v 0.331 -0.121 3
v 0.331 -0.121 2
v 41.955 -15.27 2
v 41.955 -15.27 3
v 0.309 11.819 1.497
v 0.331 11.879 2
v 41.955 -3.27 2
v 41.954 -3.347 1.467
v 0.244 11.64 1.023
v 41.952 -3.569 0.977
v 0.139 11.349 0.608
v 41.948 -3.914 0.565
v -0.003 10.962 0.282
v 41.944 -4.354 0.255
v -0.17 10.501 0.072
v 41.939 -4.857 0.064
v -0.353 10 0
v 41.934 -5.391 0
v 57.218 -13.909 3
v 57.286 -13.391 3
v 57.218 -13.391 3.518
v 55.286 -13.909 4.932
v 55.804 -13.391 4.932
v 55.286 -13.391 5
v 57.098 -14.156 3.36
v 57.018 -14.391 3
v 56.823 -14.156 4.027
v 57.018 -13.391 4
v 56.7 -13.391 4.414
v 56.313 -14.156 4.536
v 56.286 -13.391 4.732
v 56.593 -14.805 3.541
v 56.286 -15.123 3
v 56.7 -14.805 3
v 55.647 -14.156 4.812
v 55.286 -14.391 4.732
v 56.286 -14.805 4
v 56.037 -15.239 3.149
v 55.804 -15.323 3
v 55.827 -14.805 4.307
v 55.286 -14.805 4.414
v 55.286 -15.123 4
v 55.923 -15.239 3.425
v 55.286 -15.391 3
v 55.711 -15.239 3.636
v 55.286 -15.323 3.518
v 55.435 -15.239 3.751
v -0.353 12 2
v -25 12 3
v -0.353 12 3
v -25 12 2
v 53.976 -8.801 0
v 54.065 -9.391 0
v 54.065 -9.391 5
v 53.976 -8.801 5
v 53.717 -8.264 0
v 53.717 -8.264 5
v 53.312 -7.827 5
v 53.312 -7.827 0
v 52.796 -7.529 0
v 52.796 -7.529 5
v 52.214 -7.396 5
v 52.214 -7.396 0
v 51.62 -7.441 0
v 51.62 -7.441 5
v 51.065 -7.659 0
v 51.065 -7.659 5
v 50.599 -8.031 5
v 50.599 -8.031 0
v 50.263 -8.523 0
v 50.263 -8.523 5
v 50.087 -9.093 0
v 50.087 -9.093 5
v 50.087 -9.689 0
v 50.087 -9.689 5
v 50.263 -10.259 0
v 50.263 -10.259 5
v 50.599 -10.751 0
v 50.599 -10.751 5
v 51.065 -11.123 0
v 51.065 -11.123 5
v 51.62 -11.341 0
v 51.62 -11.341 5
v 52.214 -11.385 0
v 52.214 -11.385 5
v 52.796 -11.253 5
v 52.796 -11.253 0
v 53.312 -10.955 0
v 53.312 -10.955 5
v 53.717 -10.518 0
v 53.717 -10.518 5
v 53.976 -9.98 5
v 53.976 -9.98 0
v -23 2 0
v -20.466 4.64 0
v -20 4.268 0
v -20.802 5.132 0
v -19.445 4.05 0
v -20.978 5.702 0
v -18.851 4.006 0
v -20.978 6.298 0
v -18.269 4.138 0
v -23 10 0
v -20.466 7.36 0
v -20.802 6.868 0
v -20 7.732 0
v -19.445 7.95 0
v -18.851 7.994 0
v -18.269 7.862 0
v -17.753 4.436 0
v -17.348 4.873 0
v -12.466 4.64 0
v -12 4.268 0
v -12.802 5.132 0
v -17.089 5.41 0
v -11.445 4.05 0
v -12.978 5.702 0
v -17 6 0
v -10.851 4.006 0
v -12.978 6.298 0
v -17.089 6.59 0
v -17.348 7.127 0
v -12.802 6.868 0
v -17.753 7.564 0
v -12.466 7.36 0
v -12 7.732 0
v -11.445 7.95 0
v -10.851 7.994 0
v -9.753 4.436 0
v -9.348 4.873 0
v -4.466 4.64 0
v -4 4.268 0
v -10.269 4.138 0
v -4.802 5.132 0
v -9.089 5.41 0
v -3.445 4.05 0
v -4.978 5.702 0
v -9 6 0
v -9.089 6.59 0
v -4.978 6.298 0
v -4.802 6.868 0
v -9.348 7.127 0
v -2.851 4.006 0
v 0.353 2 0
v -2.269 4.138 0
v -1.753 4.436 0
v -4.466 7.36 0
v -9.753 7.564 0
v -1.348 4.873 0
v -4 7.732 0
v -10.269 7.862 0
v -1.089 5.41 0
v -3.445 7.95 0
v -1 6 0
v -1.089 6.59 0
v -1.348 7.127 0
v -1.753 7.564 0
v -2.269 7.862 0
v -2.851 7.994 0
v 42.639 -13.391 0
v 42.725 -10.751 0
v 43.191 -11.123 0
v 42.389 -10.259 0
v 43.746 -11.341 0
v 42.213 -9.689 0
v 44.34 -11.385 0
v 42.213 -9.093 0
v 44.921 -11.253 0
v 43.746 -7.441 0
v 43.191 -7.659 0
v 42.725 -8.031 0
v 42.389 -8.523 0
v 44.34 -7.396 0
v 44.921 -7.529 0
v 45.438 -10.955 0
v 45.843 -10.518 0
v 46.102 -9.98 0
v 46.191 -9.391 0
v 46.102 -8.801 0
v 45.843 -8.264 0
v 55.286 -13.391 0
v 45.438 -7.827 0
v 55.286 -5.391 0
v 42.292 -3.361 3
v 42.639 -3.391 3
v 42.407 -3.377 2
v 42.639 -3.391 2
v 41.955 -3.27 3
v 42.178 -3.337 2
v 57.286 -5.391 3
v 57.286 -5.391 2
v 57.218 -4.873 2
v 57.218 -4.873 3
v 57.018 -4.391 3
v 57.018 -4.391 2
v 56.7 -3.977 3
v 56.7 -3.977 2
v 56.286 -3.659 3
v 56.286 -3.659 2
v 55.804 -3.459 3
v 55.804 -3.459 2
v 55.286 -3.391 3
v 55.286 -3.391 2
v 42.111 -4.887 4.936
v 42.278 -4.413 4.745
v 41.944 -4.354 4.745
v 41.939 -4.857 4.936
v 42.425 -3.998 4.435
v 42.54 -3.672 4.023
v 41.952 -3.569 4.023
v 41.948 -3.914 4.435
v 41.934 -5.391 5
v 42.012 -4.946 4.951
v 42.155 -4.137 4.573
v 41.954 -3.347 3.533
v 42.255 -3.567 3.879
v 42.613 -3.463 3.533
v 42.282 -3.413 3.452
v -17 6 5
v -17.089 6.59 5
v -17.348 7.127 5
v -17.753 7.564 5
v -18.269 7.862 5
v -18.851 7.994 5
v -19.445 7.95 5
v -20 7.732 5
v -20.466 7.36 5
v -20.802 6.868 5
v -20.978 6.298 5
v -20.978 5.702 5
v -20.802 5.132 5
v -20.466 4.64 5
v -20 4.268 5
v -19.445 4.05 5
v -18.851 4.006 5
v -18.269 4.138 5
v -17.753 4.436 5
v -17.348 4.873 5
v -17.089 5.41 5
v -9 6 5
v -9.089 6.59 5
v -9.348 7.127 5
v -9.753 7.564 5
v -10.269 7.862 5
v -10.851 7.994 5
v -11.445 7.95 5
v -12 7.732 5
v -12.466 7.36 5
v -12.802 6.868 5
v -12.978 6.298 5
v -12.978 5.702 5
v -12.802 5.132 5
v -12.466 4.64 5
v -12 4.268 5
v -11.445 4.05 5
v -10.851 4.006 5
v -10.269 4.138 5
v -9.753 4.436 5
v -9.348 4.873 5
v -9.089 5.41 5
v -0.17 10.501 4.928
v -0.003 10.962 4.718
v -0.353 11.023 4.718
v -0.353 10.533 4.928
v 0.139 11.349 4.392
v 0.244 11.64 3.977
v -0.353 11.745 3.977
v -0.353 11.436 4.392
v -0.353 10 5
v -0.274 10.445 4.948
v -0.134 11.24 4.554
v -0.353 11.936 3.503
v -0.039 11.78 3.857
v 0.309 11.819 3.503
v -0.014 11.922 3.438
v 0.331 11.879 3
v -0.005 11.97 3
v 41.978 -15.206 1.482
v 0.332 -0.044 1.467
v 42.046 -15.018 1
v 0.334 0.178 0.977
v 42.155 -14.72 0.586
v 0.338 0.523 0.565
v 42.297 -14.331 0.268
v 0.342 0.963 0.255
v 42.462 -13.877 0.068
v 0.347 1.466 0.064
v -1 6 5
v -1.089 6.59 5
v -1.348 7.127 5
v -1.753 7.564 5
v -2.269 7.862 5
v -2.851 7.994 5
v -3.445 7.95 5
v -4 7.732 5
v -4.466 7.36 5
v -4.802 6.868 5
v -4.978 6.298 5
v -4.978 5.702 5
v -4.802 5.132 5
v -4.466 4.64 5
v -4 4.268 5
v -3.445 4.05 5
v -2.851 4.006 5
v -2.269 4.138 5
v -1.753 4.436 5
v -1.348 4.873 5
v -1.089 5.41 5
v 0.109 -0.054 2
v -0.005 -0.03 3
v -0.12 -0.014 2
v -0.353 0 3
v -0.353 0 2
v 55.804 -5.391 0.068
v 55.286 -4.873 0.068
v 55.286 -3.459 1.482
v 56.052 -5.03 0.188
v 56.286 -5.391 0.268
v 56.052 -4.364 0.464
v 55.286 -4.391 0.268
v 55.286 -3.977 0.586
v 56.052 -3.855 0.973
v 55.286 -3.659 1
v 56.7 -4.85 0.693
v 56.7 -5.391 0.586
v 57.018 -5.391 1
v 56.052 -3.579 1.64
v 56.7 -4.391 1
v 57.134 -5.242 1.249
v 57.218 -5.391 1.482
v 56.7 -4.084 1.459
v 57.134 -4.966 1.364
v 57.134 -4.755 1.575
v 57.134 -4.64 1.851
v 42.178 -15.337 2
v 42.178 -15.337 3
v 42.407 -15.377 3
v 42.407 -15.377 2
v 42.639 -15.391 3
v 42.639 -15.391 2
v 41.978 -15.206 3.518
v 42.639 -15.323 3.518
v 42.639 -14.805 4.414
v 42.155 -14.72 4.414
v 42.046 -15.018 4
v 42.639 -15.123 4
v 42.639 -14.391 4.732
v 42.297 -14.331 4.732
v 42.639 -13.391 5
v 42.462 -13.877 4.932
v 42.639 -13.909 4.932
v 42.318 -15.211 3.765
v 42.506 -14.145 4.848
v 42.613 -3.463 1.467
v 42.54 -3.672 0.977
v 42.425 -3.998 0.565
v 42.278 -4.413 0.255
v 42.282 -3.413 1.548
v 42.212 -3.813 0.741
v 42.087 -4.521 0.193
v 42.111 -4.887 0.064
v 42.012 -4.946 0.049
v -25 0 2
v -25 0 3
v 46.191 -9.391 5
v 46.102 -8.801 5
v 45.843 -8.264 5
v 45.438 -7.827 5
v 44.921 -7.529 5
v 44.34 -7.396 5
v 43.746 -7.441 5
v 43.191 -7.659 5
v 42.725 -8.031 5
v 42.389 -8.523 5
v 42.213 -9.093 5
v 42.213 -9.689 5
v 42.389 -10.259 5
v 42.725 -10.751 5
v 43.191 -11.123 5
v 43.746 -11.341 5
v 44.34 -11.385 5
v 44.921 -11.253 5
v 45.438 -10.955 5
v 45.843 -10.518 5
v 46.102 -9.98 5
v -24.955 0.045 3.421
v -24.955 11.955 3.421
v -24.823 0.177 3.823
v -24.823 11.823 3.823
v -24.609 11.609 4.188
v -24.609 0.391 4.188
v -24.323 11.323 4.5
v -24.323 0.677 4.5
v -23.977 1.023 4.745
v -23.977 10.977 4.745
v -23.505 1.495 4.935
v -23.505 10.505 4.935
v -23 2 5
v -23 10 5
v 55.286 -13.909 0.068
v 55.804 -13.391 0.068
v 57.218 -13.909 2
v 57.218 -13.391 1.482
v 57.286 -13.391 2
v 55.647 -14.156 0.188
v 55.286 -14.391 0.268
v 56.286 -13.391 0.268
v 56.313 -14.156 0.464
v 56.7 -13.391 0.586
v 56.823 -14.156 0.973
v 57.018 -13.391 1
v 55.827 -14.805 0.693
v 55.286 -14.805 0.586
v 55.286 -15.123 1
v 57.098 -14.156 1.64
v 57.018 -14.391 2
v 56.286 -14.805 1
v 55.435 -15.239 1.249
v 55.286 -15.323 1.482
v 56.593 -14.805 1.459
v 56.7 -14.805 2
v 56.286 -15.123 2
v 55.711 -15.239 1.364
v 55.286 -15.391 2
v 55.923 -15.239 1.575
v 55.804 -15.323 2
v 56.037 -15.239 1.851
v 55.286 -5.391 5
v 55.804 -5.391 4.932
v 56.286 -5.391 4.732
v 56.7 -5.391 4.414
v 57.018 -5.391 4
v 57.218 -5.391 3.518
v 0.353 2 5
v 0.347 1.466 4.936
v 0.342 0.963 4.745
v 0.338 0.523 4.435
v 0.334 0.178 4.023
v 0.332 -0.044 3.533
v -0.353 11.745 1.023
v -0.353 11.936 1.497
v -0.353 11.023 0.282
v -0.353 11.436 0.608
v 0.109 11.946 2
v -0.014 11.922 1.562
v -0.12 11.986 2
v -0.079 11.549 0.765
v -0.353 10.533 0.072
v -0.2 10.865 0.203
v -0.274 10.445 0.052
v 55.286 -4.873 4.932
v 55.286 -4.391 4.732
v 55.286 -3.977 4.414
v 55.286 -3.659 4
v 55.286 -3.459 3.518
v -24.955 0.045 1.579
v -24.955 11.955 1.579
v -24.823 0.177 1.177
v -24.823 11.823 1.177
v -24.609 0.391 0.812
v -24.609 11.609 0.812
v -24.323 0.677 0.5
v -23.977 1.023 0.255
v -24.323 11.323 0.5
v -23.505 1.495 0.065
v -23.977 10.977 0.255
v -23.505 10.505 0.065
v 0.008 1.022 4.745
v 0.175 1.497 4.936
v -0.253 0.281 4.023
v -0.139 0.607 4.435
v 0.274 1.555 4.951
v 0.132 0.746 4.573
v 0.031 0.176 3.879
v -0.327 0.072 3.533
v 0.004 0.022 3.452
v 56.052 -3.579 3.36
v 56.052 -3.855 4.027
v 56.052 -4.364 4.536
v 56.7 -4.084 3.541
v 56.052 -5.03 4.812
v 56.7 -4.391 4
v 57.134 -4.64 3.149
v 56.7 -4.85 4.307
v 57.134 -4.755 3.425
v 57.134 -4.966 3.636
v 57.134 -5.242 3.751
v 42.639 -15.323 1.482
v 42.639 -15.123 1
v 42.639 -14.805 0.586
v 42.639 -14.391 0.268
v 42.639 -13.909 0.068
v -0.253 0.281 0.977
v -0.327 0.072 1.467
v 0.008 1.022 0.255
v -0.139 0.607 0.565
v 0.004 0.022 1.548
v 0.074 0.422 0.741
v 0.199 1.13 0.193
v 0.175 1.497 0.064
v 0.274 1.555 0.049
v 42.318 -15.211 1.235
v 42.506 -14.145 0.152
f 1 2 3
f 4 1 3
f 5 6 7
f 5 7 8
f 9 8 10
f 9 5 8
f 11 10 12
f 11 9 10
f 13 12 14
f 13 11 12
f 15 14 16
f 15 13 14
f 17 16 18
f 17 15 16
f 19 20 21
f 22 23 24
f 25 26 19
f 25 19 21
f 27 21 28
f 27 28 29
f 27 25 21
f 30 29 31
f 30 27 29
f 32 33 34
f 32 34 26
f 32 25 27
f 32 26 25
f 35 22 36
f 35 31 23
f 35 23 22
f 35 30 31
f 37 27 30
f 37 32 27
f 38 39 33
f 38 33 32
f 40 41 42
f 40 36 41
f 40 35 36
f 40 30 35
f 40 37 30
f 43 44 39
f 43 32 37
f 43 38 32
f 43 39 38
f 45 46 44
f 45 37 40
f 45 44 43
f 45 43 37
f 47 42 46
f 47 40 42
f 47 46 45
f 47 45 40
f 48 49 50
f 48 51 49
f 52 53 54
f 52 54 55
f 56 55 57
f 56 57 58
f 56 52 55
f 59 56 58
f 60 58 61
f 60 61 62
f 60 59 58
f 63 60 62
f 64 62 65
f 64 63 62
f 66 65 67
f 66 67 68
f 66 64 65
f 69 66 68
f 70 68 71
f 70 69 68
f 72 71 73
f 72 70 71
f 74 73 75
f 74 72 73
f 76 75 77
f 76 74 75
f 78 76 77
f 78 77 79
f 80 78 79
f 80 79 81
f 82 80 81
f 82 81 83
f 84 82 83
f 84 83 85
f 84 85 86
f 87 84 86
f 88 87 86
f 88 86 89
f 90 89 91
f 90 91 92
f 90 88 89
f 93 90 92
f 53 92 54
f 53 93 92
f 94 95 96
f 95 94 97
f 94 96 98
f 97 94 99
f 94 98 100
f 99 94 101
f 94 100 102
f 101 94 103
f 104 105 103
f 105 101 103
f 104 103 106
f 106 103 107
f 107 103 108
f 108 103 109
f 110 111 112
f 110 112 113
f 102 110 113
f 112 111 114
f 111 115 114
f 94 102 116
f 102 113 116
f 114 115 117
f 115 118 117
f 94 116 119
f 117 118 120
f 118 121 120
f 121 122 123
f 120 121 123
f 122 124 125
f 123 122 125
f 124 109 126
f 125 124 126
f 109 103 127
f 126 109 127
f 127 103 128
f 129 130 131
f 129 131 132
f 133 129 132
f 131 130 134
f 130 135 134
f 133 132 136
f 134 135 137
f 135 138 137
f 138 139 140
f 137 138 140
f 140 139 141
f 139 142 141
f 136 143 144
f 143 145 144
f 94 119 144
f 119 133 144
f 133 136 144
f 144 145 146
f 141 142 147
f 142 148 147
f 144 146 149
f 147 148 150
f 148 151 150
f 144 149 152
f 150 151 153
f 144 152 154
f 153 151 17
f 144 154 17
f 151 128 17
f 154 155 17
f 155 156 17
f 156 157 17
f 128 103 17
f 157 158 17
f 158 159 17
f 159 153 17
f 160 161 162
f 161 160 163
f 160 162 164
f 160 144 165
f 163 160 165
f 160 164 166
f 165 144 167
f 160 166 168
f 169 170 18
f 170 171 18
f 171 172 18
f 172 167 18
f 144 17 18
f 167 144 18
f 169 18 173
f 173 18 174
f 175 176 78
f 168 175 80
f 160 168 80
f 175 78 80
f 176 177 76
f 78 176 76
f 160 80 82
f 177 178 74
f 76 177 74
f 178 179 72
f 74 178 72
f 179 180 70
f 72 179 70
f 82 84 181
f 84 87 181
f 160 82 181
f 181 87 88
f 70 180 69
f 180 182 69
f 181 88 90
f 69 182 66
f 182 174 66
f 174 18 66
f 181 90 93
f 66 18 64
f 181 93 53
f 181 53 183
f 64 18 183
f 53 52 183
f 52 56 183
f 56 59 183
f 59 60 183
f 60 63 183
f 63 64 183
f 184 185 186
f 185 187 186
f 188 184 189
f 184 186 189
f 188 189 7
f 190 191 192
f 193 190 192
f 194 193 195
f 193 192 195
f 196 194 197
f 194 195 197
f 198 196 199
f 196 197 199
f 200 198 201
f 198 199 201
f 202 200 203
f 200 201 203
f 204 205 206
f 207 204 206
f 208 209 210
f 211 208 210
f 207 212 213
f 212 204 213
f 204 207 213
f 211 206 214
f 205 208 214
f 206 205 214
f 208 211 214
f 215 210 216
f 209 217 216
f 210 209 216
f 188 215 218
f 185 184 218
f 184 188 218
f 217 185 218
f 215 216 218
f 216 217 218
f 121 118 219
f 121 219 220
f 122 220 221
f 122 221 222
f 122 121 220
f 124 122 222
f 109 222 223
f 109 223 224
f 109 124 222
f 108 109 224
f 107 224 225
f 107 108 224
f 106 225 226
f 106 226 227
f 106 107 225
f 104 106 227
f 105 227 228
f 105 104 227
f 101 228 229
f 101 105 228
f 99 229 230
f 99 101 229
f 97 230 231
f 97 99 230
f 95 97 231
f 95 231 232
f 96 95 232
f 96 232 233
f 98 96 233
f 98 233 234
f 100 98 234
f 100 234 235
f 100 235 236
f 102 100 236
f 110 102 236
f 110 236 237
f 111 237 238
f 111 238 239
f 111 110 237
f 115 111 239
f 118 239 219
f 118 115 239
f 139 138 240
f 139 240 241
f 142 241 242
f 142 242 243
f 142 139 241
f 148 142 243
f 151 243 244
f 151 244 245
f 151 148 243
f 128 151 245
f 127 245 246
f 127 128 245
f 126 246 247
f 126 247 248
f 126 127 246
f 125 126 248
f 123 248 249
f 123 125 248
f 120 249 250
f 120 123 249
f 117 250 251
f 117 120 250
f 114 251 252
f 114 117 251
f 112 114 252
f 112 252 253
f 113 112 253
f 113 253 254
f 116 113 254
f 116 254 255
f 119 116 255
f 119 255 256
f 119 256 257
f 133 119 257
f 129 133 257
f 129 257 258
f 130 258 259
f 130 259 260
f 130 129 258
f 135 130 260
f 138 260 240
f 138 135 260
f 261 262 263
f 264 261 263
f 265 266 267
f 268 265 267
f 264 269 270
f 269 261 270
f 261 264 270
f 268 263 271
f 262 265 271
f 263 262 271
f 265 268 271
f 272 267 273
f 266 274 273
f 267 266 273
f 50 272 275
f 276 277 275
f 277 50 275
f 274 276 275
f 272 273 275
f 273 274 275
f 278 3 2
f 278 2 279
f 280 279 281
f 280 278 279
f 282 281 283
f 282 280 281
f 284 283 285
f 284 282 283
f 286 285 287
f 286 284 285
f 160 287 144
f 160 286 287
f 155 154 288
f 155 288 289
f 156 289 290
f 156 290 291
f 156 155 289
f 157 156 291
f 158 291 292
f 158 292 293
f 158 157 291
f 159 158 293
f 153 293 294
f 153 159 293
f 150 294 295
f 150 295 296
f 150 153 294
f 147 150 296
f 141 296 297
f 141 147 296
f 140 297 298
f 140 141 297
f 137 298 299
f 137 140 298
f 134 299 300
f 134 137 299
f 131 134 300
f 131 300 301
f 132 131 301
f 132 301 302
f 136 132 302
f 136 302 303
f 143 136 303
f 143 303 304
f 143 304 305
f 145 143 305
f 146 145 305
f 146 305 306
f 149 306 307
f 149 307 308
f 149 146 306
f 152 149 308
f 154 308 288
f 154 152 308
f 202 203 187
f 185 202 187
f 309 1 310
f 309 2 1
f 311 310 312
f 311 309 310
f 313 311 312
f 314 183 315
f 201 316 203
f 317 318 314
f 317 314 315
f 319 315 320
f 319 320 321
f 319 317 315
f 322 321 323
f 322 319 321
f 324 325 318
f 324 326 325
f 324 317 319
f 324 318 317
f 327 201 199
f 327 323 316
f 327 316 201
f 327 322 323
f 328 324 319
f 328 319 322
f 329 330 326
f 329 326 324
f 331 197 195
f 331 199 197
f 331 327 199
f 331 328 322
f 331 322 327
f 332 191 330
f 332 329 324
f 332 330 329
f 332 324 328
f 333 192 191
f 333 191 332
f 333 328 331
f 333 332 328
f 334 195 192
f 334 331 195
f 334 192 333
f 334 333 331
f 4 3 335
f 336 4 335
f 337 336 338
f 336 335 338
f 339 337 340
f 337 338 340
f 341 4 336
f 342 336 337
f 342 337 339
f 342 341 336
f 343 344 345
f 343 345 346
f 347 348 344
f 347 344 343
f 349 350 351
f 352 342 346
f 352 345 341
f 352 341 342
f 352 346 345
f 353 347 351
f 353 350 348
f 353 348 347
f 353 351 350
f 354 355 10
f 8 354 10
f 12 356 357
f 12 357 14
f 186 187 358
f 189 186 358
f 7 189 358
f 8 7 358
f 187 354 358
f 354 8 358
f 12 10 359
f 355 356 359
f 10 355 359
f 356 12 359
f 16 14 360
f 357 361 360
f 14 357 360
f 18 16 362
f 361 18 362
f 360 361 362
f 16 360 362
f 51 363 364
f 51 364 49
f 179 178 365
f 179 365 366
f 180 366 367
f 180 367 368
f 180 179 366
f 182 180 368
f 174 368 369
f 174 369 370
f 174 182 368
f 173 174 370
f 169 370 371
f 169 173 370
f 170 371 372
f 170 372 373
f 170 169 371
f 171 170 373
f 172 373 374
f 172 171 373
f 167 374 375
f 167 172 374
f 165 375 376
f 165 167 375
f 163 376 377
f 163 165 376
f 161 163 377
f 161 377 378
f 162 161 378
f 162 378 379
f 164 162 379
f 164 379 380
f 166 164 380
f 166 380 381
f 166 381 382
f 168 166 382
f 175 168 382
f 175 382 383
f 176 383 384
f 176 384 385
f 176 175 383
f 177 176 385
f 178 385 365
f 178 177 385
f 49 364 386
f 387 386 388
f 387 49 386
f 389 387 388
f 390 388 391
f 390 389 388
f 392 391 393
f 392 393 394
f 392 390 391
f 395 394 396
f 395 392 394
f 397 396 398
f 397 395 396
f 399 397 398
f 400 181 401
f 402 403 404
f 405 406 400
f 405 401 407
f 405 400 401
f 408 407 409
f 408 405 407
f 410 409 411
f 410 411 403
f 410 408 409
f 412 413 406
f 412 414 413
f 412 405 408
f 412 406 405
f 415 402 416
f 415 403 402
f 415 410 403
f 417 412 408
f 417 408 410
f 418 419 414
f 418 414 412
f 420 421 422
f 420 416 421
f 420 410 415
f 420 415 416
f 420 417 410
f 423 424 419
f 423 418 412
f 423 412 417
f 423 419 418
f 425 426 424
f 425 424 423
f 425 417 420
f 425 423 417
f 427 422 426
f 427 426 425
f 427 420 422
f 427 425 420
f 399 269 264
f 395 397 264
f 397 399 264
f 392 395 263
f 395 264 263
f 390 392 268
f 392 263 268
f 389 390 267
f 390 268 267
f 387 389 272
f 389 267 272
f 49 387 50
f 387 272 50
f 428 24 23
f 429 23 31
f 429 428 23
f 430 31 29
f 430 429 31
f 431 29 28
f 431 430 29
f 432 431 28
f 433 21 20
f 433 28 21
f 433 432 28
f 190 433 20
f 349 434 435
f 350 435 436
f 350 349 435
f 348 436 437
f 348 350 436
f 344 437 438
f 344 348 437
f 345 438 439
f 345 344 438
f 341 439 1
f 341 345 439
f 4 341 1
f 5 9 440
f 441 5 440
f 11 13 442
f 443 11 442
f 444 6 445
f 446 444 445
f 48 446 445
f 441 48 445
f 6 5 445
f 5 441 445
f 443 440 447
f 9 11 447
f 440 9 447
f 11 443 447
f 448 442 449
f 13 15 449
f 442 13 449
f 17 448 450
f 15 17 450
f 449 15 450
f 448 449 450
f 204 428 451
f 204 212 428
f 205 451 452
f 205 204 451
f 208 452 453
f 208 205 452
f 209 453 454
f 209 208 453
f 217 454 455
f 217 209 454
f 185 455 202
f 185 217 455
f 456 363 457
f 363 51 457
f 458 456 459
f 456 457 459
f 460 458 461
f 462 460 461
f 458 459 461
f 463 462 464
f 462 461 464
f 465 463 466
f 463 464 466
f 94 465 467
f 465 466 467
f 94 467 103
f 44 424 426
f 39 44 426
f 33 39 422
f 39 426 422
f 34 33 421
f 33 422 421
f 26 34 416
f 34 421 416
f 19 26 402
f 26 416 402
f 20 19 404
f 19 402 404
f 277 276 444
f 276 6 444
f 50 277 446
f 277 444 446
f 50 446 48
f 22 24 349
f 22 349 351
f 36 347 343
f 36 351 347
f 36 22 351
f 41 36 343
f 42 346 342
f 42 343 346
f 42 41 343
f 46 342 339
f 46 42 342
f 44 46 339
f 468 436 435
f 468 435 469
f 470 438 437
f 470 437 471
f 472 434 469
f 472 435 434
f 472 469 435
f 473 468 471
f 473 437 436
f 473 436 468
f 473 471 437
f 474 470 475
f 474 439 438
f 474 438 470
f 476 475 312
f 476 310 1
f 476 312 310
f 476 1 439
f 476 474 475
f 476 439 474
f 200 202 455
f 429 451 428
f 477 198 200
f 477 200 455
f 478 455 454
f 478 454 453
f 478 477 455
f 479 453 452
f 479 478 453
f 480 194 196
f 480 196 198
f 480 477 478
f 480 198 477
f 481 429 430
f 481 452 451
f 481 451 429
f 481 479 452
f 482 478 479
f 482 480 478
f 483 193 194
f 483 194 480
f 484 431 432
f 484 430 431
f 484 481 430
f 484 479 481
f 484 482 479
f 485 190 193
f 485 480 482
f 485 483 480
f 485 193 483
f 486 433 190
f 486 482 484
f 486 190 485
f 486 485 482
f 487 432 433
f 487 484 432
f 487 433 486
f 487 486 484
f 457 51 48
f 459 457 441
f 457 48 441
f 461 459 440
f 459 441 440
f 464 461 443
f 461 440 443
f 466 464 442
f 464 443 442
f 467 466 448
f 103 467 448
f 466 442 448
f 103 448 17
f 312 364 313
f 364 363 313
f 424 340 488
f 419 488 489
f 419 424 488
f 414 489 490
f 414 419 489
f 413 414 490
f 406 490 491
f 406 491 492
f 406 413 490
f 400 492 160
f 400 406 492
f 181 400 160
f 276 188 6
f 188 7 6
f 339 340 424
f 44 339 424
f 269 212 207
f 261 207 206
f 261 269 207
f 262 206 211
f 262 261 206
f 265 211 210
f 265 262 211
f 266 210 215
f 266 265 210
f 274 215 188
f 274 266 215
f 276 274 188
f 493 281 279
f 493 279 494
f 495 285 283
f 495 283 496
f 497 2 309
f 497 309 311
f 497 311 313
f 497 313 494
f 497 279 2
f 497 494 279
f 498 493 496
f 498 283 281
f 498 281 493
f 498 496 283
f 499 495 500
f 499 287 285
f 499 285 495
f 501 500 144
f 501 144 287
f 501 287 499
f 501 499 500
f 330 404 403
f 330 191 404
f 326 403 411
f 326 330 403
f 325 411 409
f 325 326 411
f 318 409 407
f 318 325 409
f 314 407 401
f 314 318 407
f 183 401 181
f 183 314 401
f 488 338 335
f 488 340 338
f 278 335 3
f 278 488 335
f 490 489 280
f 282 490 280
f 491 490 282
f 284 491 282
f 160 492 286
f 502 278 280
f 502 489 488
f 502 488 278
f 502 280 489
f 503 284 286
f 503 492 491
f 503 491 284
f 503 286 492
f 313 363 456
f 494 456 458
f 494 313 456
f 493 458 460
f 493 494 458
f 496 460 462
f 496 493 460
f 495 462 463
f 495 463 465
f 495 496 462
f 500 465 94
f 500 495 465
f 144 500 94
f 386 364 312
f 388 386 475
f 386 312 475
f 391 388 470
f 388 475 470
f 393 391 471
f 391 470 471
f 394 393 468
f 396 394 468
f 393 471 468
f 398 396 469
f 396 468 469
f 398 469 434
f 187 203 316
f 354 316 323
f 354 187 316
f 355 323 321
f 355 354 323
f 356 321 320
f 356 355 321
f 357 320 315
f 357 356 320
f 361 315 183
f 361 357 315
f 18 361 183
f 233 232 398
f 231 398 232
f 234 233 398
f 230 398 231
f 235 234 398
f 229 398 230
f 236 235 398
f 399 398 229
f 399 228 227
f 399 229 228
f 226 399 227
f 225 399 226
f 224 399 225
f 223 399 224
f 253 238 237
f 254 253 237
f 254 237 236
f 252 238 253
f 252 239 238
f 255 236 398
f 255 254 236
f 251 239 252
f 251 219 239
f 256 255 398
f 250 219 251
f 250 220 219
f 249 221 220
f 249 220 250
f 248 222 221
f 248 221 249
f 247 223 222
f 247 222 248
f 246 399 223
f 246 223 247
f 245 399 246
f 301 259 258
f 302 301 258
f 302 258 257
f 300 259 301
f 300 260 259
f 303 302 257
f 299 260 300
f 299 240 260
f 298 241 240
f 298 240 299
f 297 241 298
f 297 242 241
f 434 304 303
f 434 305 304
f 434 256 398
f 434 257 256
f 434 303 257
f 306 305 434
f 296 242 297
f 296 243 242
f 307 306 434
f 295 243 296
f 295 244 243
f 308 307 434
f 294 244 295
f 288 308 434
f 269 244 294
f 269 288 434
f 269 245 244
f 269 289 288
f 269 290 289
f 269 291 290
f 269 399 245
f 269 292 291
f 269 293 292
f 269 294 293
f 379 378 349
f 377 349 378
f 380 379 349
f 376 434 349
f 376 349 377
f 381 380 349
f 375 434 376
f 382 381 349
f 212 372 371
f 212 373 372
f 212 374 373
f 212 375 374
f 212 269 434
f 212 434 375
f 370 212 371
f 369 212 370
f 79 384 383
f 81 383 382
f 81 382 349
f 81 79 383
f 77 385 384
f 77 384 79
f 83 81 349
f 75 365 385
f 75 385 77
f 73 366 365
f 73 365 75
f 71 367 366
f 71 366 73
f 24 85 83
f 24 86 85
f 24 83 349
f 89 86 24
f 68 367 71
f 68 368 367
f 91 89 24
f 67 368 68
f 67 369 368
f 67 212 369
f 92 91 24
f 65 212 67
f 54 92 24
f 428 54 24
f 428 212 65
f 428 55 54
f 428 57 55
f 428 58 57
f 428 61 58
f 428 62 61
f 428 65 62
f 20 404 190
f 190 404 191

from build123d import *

# Parameters (mm, degrees)
F0_W         = 25
F0_H         = 12
F0_R         = 2
F1_DEPTH     = 5
F2_R         = 2
F3_R         = 2
F4_R         = 2
F5_R         = 2
F6_T1_DEPTH  = 1
F6_T6_DEPTH  = 2
F6_T12_DEPTH = 2
F6_S17_W     = 2
F6_S17_H     = 2
F6_T18_DEPTH = 2
F6_S23_W     = 2
F6_S23_H     = 2
F6_T24_DEPTH = 2
F7_T1_DEPTH  = 1
F7_S5_W      = 2
F7_S5_H      = 2
F7_T6_DEPTH  = 2
F7_S11_W     = 2
F7_S11_H     = 2
F7_T12_DEPTH = 2
F8_R         = 2


# Not quite as in the source:
# - a fillet or chamfer that OpenCascade refuses, or shapes differently, is made with other operations: its cross-section is extruded or revolved along the edge and cut away or added


with BuildPart() as f1:
    # F0 (on Top) → F1 (new body)
    with BuildSketch(Plane.XY):
        with Locations((-12.5, 6)):
            Rectangle(F0_W, F0_H)
        with Locations((-19, 6)):
            Circle(F0_R, mode=Mode.SUBTRACT)
        with Locations((-11, 6)):
            Circle(F0_R, mode=Mode.SUBTRACT)
        with Locations((-3, 6)):
            Circle(F0_R, mode=Mode.SUBTRACT)
        Polygon((0, 12), (0, 0), (42.2861679354, -15.3909064497), (57.2861679354, -15.3909064497), (57.2861679354, -3.3909064497), (42.2861679354, -3.3909064497), align=None)
        with Locations((44.1906489432, -9.3909064497)):
            Circle(F0_R, mode=Mode.SUBTRACT)
        with Locations((52.0649450129, -9.3909064497)):
            Circle(F0_R, mode=Mode.SUBTRACT)
    extrude(amount=F1_DEPTH)

    # F2
    f2_edges = [f1.edges().sort_by_distance(p)[0] for p in [
        (-12.5, 0, 0),
        (-25, 6, 0),
        (-12.5, 12, 0),
        (21.143084, 4.304547, 0),
        (49.786168, -3.390906, 0),
        (57.286168, -9.390906, 0),
        (49.786168, -15.390906, 0),
        (21.143084, -7.695453, 0),
    ]]
    fillet(f2_edges, radius=F2_R)

    # F3
    f3_edges = [f1.edges().sort_by_distance(p)[0] for p in [
        (57.286168, -9.390906, 5),
        (49.786168, -15.390906, 5),
        (21.143084, -7.695453, 5),
        (-12.5, 0, 5),
        (-25, 6, 5),
        (-12.5, 12, 5),
        (21.143084, 4.304547, 5),
        (49.786168, -3.390906, 5),
    ]]
    fillet(f3_edges, radius=F3_R)

    # F4
    f4_edges = [f1.edges().sort_by_distance(p)[0] for p in [
        (42.181922, -3.982115, 4.419615),
        (42.286168, -3.390906, 2.5),
        (42.181922, -3.982115, 0.580385),
    ]]
    fillet(f4_edges, radius=F4_R)

    # F5
    f5_edges = [f1.edges().sort_by_distance(p)[0] for p in [
        (0.104246, 0.591209, 4.419615),
        (0, 0, 2.5),
        (0.104246, 0.591209, 0.580385),
    ]]
    fillet(f5_edges, radius=F5_R)

    # F6: fillet of radius 2 on 6 edges, made by hand

    # F6_s2 → F6_t1 (cut)
    with BuildSketch(Plane.XY.offset(2)):
        with BuildLine():
            ThreePointArc((41.9547816101, -15.2702916912), (42.2915255414, -15.3605219557), (42.6388218968, -15.3909064497))
            Line((42.6388218968, -15.3909064497), (42.2861679354, -15.3909064497))
            Line((42.2861679354, -15.3909064497), (41.9547816101, -15.2702916912))
        make_face()
        with BuildLine():
            ThreePointArc((55.2861679354, -15.3909064497), (56.7003814977, -14.805120012), (57.2861679354, -13.3909064497))
            Line((57.2861679354, -13.3909064497), (57.2861679354, -15.3909064497))
            Line((57.2861679354, -15.3909064497), (55.2861679354, -15.3909064497))
        make_face()
    extrude(amount=F6_T1_DEPTH, mode=Mode.SUBTRACT)


with BuildPart() as f6_tool4:
    # F6_s5 → F6_t6 (new body)
    with BuildSketch(Plane.XY.offset(3)):
        Polygon((42.6388218968, -13.3909064497), (41.9547816101, -15.2702916912), (42.2861679354, -15.3909064497), (42.6388218968, -15.3909064497), align=None)
    extrude(amount=F6_T6_DEPTH)

    # F6_s7 → F6_t8 (revolve, cut)
    with BuildSketch(Plane(origin=(42.6388218968, -13.3909064497, 3), x_dir=(0.1736481777, 0.984807753, 0), z_dir=(0.984807753, -0.1736481777, 0))):
        with BuildLine():
            ThreePointArc((0, -2), (2, 0), (0, 2))
            Line((0, 2), (0, -2))
        make_face()
    revolve(axis=Axis((42.6388218968, -13.3909064497, 3), (0, 0, 1)), mode=Mode.SUBTRACT)


with BuildPart() as f1_1:
    add(f1.part)

    # F6_t3: cut F6_tool4
    add(f6_tool4.part, mode=Mode.SUBTRACT)


with BuildPart() as f6_tool10:
    # F6_s11 → F6_t12 (new body)
    with BuildSketch(Plane.XY.offset(2)):
        Polygon((42.6388218968, -13.3909064497), (41.9547816101, -15.2702916912), (42.2861679354, -15.3909064497), (42.6388218968, -15.3909064497), align=None)
    extrude(amount=-F6_T12_DEPTH)

    # F6_s13 → F6_t14 (revolve, cut)
    with BuildSketch(Plane(origin=(42.6388218968, -13.3909064497, 2), x_dir=(0.1736481777, 0.984807753, 0), z_dir=(-0.984807753, 0.1736481777, 0))):
        with BuildLine():
            ThreePointArc((0, -2), (2, 0), (0, 2))
            Line((0, 2), (0, -2))
        make_face()
    revolve(axis=Axis((42.6388218968, -13.3909064497, 2), (0, 0, -1)), mode=Mode.SUBTRACT)


with BuildPart() as f1_2:
    add(f1_1.part)

    # F6_t9: cut F6_tool10
    add(f6_tool10.part, mode=Mode.SUBTRACT)


with BuildPart() as f6_tool16:
    # F6_s17 → F6_t18 (new body)
    with BuildSketch(Plane.XZ.offset(13.3909064497)):
        with Locations((56.2861679354, 4)):
            Rectangle(F6_S17_W, F6_S17_H)
    extrude(amount=F6_T18_DEPTH)

    # F6_s19 → F6_t20 (revolve, cut)
    with BuildSketch(Plane(origin=(55.2861679354, -13.3909064497, 3), x_dir=(-0.7071067812, 0, -0.7071067812), z_dir=(-0.7071067812, 0, 0.7071067812))):
        with BuildLine():
            ThreePointArc((0, -2), (2, 0), (0, 2))
            Line((0, 2), (0, -2))
        make_face()
    revolve(axis=Axis((55.2861679354, -13.3909064497, 3), (0, -1, 0)), mode=Mode.SUBTRACT)


with BuildPart() as f1_3:
    add(f1_2.part)

    # F6_t15: cut F6_tool16
    add(f6_tool16.part, mode=Mode.SUBTRACT)


with BuildPart() as f6_tool22:
    # F6_s23 → F6_t24 (new body)
    with BuildSketch(Plane.XZ.offset(13.3909064497)):
        with Locations((56.2861679354, 1)):
            Rectangle(F6_S23_W, F6_S23_H)
    extrude(amount=F6_T24_DEPTH)

    # F6_s25 → F6_t26 (revolve, cut)
    with BuildSketch(Plane(origin=(55.2861679354, -13.3909064497, 2), x_dir=(-0.7071067812, 0, 0.7071067812), z_dir=(0.7071067812, 0, 0.7071067812))):
        with BuildLine():
            ThreePointArc((0, -2), (2, 0), (0, 2))
            Line((0, 2), (0, -2))
        make_face()
    revolve(axis=Axis((55.2861679354, -13.3909064497, 2), (0, -1, 0)), mode=Mode.SUBTRACT)


with BuildPart() as f1_4:
    add(f1_3.part)

    # F6_t21: cut F6_tool22
    add(f6_tool22.part, mode=Mode.SUBTRACT)

    # F7: fillet of radius 2 on 3 edges, made by hand

    # F7_s2 → F7_t1 (cut)
    with BuildSketch(Plane.XY.offset(2)):
        with BuildLine():
            ThreePointArc((57.2861679354, -5.3909064497), (56.7003814977, -3.9766928873), (55.2861679354, -3.3909064497))
            Line((55.2861679354, -3.3909064497), (57.2861679354, -3.3909064497))
            Line((57.2861679354, -3.3909064497), (57.2861679354, -5.3909064497))
        make_face()
    extrude(amount=F7_T1_DEPTH, mode=Mode.SUBTRACT)


with BuildPart() as f7_tool4:
    # F7_s5 → F7_t6 (new body)
    with BuildSketch(Plane.YZ.offset(55.2861679354)):
        with Locations((-4.3909064497, 4)):
            Rectangle(F7_S5_W, F7_S5_H)
    extrude(amount=F7_T6_DEPTH)

    # F7_s7 → F7_t8 (revolve, cut)
    with BuildSketch(Plane(origin=(55.2861679354, -5.3909064497, 3), x_dir=(0, -0.7071067812, -0.7071067812), z_dir=(0, -0.7071067812, 0.7071067812))):
        with BuildLine():
            ThreePointArc((0, -2), (2, 0), (0, 2))
            Line((0, 2), (0, -2))
        make_face()
    revolve(axis=Axis((55.2861679354, -5.3909064497, 3), (1, 0, 0)), mode=Mode.SUBTRACT)


with BuildPart() as f1_5:
    add(f1_4.part)

    # F7_t3: cut F7_tool4
    add(f7_tool4.part, mode=Mode.SUBTRACT)


with BuildPart() as f7_tool10:
    # F7_s11 → F7_t12 (new body)
    with BuildSketch(Plane.YZ.offset(55.2861679354)):
        with Locations((-4.3909064497, 1)):
            Rectangle(F7_S11_W, F7_S11_H)
    extrude(amount=F7_T12_DEPTH)

    # F7_s13 → F7_t14 (revolve, cut)
    with BuildSketch(Plane(origin=(55.2861679354, -5.3909064497, 2), x_dir=(0, -0.7071067812, 0.7071067812), z_dir=(0, 0.7071067812, 0.7071067812))):
        with BuildLine():
            ThreePointArc((0, -2), (2, 0), (0, 2))
            Line((0, 2), (0, -2))
        make_face()
    revolve(axis=Axis((55.2861679354, -5.3909064497, 2), (1, 0, 0)), mode=Mode.SUBTRACT)


with BuildPart() as f1_6:
    add(f1_5.part)

    # F7_t9: cut F7_tool10
    add(f7_tool10.part, mode=Mode.SUBTRACT)

    # F8
    f8_edges = [f1_6.edges().sort_by_distance(p)[0] for p in [
        (-0.104246, 11.408791, 0.580385),
        (-0.104246, 11.408791, 4.419615),
        (0, 12, 2.5),
    ]]
    fillet(f8_edges, radius=F8_R)


solid = f1_6.part
